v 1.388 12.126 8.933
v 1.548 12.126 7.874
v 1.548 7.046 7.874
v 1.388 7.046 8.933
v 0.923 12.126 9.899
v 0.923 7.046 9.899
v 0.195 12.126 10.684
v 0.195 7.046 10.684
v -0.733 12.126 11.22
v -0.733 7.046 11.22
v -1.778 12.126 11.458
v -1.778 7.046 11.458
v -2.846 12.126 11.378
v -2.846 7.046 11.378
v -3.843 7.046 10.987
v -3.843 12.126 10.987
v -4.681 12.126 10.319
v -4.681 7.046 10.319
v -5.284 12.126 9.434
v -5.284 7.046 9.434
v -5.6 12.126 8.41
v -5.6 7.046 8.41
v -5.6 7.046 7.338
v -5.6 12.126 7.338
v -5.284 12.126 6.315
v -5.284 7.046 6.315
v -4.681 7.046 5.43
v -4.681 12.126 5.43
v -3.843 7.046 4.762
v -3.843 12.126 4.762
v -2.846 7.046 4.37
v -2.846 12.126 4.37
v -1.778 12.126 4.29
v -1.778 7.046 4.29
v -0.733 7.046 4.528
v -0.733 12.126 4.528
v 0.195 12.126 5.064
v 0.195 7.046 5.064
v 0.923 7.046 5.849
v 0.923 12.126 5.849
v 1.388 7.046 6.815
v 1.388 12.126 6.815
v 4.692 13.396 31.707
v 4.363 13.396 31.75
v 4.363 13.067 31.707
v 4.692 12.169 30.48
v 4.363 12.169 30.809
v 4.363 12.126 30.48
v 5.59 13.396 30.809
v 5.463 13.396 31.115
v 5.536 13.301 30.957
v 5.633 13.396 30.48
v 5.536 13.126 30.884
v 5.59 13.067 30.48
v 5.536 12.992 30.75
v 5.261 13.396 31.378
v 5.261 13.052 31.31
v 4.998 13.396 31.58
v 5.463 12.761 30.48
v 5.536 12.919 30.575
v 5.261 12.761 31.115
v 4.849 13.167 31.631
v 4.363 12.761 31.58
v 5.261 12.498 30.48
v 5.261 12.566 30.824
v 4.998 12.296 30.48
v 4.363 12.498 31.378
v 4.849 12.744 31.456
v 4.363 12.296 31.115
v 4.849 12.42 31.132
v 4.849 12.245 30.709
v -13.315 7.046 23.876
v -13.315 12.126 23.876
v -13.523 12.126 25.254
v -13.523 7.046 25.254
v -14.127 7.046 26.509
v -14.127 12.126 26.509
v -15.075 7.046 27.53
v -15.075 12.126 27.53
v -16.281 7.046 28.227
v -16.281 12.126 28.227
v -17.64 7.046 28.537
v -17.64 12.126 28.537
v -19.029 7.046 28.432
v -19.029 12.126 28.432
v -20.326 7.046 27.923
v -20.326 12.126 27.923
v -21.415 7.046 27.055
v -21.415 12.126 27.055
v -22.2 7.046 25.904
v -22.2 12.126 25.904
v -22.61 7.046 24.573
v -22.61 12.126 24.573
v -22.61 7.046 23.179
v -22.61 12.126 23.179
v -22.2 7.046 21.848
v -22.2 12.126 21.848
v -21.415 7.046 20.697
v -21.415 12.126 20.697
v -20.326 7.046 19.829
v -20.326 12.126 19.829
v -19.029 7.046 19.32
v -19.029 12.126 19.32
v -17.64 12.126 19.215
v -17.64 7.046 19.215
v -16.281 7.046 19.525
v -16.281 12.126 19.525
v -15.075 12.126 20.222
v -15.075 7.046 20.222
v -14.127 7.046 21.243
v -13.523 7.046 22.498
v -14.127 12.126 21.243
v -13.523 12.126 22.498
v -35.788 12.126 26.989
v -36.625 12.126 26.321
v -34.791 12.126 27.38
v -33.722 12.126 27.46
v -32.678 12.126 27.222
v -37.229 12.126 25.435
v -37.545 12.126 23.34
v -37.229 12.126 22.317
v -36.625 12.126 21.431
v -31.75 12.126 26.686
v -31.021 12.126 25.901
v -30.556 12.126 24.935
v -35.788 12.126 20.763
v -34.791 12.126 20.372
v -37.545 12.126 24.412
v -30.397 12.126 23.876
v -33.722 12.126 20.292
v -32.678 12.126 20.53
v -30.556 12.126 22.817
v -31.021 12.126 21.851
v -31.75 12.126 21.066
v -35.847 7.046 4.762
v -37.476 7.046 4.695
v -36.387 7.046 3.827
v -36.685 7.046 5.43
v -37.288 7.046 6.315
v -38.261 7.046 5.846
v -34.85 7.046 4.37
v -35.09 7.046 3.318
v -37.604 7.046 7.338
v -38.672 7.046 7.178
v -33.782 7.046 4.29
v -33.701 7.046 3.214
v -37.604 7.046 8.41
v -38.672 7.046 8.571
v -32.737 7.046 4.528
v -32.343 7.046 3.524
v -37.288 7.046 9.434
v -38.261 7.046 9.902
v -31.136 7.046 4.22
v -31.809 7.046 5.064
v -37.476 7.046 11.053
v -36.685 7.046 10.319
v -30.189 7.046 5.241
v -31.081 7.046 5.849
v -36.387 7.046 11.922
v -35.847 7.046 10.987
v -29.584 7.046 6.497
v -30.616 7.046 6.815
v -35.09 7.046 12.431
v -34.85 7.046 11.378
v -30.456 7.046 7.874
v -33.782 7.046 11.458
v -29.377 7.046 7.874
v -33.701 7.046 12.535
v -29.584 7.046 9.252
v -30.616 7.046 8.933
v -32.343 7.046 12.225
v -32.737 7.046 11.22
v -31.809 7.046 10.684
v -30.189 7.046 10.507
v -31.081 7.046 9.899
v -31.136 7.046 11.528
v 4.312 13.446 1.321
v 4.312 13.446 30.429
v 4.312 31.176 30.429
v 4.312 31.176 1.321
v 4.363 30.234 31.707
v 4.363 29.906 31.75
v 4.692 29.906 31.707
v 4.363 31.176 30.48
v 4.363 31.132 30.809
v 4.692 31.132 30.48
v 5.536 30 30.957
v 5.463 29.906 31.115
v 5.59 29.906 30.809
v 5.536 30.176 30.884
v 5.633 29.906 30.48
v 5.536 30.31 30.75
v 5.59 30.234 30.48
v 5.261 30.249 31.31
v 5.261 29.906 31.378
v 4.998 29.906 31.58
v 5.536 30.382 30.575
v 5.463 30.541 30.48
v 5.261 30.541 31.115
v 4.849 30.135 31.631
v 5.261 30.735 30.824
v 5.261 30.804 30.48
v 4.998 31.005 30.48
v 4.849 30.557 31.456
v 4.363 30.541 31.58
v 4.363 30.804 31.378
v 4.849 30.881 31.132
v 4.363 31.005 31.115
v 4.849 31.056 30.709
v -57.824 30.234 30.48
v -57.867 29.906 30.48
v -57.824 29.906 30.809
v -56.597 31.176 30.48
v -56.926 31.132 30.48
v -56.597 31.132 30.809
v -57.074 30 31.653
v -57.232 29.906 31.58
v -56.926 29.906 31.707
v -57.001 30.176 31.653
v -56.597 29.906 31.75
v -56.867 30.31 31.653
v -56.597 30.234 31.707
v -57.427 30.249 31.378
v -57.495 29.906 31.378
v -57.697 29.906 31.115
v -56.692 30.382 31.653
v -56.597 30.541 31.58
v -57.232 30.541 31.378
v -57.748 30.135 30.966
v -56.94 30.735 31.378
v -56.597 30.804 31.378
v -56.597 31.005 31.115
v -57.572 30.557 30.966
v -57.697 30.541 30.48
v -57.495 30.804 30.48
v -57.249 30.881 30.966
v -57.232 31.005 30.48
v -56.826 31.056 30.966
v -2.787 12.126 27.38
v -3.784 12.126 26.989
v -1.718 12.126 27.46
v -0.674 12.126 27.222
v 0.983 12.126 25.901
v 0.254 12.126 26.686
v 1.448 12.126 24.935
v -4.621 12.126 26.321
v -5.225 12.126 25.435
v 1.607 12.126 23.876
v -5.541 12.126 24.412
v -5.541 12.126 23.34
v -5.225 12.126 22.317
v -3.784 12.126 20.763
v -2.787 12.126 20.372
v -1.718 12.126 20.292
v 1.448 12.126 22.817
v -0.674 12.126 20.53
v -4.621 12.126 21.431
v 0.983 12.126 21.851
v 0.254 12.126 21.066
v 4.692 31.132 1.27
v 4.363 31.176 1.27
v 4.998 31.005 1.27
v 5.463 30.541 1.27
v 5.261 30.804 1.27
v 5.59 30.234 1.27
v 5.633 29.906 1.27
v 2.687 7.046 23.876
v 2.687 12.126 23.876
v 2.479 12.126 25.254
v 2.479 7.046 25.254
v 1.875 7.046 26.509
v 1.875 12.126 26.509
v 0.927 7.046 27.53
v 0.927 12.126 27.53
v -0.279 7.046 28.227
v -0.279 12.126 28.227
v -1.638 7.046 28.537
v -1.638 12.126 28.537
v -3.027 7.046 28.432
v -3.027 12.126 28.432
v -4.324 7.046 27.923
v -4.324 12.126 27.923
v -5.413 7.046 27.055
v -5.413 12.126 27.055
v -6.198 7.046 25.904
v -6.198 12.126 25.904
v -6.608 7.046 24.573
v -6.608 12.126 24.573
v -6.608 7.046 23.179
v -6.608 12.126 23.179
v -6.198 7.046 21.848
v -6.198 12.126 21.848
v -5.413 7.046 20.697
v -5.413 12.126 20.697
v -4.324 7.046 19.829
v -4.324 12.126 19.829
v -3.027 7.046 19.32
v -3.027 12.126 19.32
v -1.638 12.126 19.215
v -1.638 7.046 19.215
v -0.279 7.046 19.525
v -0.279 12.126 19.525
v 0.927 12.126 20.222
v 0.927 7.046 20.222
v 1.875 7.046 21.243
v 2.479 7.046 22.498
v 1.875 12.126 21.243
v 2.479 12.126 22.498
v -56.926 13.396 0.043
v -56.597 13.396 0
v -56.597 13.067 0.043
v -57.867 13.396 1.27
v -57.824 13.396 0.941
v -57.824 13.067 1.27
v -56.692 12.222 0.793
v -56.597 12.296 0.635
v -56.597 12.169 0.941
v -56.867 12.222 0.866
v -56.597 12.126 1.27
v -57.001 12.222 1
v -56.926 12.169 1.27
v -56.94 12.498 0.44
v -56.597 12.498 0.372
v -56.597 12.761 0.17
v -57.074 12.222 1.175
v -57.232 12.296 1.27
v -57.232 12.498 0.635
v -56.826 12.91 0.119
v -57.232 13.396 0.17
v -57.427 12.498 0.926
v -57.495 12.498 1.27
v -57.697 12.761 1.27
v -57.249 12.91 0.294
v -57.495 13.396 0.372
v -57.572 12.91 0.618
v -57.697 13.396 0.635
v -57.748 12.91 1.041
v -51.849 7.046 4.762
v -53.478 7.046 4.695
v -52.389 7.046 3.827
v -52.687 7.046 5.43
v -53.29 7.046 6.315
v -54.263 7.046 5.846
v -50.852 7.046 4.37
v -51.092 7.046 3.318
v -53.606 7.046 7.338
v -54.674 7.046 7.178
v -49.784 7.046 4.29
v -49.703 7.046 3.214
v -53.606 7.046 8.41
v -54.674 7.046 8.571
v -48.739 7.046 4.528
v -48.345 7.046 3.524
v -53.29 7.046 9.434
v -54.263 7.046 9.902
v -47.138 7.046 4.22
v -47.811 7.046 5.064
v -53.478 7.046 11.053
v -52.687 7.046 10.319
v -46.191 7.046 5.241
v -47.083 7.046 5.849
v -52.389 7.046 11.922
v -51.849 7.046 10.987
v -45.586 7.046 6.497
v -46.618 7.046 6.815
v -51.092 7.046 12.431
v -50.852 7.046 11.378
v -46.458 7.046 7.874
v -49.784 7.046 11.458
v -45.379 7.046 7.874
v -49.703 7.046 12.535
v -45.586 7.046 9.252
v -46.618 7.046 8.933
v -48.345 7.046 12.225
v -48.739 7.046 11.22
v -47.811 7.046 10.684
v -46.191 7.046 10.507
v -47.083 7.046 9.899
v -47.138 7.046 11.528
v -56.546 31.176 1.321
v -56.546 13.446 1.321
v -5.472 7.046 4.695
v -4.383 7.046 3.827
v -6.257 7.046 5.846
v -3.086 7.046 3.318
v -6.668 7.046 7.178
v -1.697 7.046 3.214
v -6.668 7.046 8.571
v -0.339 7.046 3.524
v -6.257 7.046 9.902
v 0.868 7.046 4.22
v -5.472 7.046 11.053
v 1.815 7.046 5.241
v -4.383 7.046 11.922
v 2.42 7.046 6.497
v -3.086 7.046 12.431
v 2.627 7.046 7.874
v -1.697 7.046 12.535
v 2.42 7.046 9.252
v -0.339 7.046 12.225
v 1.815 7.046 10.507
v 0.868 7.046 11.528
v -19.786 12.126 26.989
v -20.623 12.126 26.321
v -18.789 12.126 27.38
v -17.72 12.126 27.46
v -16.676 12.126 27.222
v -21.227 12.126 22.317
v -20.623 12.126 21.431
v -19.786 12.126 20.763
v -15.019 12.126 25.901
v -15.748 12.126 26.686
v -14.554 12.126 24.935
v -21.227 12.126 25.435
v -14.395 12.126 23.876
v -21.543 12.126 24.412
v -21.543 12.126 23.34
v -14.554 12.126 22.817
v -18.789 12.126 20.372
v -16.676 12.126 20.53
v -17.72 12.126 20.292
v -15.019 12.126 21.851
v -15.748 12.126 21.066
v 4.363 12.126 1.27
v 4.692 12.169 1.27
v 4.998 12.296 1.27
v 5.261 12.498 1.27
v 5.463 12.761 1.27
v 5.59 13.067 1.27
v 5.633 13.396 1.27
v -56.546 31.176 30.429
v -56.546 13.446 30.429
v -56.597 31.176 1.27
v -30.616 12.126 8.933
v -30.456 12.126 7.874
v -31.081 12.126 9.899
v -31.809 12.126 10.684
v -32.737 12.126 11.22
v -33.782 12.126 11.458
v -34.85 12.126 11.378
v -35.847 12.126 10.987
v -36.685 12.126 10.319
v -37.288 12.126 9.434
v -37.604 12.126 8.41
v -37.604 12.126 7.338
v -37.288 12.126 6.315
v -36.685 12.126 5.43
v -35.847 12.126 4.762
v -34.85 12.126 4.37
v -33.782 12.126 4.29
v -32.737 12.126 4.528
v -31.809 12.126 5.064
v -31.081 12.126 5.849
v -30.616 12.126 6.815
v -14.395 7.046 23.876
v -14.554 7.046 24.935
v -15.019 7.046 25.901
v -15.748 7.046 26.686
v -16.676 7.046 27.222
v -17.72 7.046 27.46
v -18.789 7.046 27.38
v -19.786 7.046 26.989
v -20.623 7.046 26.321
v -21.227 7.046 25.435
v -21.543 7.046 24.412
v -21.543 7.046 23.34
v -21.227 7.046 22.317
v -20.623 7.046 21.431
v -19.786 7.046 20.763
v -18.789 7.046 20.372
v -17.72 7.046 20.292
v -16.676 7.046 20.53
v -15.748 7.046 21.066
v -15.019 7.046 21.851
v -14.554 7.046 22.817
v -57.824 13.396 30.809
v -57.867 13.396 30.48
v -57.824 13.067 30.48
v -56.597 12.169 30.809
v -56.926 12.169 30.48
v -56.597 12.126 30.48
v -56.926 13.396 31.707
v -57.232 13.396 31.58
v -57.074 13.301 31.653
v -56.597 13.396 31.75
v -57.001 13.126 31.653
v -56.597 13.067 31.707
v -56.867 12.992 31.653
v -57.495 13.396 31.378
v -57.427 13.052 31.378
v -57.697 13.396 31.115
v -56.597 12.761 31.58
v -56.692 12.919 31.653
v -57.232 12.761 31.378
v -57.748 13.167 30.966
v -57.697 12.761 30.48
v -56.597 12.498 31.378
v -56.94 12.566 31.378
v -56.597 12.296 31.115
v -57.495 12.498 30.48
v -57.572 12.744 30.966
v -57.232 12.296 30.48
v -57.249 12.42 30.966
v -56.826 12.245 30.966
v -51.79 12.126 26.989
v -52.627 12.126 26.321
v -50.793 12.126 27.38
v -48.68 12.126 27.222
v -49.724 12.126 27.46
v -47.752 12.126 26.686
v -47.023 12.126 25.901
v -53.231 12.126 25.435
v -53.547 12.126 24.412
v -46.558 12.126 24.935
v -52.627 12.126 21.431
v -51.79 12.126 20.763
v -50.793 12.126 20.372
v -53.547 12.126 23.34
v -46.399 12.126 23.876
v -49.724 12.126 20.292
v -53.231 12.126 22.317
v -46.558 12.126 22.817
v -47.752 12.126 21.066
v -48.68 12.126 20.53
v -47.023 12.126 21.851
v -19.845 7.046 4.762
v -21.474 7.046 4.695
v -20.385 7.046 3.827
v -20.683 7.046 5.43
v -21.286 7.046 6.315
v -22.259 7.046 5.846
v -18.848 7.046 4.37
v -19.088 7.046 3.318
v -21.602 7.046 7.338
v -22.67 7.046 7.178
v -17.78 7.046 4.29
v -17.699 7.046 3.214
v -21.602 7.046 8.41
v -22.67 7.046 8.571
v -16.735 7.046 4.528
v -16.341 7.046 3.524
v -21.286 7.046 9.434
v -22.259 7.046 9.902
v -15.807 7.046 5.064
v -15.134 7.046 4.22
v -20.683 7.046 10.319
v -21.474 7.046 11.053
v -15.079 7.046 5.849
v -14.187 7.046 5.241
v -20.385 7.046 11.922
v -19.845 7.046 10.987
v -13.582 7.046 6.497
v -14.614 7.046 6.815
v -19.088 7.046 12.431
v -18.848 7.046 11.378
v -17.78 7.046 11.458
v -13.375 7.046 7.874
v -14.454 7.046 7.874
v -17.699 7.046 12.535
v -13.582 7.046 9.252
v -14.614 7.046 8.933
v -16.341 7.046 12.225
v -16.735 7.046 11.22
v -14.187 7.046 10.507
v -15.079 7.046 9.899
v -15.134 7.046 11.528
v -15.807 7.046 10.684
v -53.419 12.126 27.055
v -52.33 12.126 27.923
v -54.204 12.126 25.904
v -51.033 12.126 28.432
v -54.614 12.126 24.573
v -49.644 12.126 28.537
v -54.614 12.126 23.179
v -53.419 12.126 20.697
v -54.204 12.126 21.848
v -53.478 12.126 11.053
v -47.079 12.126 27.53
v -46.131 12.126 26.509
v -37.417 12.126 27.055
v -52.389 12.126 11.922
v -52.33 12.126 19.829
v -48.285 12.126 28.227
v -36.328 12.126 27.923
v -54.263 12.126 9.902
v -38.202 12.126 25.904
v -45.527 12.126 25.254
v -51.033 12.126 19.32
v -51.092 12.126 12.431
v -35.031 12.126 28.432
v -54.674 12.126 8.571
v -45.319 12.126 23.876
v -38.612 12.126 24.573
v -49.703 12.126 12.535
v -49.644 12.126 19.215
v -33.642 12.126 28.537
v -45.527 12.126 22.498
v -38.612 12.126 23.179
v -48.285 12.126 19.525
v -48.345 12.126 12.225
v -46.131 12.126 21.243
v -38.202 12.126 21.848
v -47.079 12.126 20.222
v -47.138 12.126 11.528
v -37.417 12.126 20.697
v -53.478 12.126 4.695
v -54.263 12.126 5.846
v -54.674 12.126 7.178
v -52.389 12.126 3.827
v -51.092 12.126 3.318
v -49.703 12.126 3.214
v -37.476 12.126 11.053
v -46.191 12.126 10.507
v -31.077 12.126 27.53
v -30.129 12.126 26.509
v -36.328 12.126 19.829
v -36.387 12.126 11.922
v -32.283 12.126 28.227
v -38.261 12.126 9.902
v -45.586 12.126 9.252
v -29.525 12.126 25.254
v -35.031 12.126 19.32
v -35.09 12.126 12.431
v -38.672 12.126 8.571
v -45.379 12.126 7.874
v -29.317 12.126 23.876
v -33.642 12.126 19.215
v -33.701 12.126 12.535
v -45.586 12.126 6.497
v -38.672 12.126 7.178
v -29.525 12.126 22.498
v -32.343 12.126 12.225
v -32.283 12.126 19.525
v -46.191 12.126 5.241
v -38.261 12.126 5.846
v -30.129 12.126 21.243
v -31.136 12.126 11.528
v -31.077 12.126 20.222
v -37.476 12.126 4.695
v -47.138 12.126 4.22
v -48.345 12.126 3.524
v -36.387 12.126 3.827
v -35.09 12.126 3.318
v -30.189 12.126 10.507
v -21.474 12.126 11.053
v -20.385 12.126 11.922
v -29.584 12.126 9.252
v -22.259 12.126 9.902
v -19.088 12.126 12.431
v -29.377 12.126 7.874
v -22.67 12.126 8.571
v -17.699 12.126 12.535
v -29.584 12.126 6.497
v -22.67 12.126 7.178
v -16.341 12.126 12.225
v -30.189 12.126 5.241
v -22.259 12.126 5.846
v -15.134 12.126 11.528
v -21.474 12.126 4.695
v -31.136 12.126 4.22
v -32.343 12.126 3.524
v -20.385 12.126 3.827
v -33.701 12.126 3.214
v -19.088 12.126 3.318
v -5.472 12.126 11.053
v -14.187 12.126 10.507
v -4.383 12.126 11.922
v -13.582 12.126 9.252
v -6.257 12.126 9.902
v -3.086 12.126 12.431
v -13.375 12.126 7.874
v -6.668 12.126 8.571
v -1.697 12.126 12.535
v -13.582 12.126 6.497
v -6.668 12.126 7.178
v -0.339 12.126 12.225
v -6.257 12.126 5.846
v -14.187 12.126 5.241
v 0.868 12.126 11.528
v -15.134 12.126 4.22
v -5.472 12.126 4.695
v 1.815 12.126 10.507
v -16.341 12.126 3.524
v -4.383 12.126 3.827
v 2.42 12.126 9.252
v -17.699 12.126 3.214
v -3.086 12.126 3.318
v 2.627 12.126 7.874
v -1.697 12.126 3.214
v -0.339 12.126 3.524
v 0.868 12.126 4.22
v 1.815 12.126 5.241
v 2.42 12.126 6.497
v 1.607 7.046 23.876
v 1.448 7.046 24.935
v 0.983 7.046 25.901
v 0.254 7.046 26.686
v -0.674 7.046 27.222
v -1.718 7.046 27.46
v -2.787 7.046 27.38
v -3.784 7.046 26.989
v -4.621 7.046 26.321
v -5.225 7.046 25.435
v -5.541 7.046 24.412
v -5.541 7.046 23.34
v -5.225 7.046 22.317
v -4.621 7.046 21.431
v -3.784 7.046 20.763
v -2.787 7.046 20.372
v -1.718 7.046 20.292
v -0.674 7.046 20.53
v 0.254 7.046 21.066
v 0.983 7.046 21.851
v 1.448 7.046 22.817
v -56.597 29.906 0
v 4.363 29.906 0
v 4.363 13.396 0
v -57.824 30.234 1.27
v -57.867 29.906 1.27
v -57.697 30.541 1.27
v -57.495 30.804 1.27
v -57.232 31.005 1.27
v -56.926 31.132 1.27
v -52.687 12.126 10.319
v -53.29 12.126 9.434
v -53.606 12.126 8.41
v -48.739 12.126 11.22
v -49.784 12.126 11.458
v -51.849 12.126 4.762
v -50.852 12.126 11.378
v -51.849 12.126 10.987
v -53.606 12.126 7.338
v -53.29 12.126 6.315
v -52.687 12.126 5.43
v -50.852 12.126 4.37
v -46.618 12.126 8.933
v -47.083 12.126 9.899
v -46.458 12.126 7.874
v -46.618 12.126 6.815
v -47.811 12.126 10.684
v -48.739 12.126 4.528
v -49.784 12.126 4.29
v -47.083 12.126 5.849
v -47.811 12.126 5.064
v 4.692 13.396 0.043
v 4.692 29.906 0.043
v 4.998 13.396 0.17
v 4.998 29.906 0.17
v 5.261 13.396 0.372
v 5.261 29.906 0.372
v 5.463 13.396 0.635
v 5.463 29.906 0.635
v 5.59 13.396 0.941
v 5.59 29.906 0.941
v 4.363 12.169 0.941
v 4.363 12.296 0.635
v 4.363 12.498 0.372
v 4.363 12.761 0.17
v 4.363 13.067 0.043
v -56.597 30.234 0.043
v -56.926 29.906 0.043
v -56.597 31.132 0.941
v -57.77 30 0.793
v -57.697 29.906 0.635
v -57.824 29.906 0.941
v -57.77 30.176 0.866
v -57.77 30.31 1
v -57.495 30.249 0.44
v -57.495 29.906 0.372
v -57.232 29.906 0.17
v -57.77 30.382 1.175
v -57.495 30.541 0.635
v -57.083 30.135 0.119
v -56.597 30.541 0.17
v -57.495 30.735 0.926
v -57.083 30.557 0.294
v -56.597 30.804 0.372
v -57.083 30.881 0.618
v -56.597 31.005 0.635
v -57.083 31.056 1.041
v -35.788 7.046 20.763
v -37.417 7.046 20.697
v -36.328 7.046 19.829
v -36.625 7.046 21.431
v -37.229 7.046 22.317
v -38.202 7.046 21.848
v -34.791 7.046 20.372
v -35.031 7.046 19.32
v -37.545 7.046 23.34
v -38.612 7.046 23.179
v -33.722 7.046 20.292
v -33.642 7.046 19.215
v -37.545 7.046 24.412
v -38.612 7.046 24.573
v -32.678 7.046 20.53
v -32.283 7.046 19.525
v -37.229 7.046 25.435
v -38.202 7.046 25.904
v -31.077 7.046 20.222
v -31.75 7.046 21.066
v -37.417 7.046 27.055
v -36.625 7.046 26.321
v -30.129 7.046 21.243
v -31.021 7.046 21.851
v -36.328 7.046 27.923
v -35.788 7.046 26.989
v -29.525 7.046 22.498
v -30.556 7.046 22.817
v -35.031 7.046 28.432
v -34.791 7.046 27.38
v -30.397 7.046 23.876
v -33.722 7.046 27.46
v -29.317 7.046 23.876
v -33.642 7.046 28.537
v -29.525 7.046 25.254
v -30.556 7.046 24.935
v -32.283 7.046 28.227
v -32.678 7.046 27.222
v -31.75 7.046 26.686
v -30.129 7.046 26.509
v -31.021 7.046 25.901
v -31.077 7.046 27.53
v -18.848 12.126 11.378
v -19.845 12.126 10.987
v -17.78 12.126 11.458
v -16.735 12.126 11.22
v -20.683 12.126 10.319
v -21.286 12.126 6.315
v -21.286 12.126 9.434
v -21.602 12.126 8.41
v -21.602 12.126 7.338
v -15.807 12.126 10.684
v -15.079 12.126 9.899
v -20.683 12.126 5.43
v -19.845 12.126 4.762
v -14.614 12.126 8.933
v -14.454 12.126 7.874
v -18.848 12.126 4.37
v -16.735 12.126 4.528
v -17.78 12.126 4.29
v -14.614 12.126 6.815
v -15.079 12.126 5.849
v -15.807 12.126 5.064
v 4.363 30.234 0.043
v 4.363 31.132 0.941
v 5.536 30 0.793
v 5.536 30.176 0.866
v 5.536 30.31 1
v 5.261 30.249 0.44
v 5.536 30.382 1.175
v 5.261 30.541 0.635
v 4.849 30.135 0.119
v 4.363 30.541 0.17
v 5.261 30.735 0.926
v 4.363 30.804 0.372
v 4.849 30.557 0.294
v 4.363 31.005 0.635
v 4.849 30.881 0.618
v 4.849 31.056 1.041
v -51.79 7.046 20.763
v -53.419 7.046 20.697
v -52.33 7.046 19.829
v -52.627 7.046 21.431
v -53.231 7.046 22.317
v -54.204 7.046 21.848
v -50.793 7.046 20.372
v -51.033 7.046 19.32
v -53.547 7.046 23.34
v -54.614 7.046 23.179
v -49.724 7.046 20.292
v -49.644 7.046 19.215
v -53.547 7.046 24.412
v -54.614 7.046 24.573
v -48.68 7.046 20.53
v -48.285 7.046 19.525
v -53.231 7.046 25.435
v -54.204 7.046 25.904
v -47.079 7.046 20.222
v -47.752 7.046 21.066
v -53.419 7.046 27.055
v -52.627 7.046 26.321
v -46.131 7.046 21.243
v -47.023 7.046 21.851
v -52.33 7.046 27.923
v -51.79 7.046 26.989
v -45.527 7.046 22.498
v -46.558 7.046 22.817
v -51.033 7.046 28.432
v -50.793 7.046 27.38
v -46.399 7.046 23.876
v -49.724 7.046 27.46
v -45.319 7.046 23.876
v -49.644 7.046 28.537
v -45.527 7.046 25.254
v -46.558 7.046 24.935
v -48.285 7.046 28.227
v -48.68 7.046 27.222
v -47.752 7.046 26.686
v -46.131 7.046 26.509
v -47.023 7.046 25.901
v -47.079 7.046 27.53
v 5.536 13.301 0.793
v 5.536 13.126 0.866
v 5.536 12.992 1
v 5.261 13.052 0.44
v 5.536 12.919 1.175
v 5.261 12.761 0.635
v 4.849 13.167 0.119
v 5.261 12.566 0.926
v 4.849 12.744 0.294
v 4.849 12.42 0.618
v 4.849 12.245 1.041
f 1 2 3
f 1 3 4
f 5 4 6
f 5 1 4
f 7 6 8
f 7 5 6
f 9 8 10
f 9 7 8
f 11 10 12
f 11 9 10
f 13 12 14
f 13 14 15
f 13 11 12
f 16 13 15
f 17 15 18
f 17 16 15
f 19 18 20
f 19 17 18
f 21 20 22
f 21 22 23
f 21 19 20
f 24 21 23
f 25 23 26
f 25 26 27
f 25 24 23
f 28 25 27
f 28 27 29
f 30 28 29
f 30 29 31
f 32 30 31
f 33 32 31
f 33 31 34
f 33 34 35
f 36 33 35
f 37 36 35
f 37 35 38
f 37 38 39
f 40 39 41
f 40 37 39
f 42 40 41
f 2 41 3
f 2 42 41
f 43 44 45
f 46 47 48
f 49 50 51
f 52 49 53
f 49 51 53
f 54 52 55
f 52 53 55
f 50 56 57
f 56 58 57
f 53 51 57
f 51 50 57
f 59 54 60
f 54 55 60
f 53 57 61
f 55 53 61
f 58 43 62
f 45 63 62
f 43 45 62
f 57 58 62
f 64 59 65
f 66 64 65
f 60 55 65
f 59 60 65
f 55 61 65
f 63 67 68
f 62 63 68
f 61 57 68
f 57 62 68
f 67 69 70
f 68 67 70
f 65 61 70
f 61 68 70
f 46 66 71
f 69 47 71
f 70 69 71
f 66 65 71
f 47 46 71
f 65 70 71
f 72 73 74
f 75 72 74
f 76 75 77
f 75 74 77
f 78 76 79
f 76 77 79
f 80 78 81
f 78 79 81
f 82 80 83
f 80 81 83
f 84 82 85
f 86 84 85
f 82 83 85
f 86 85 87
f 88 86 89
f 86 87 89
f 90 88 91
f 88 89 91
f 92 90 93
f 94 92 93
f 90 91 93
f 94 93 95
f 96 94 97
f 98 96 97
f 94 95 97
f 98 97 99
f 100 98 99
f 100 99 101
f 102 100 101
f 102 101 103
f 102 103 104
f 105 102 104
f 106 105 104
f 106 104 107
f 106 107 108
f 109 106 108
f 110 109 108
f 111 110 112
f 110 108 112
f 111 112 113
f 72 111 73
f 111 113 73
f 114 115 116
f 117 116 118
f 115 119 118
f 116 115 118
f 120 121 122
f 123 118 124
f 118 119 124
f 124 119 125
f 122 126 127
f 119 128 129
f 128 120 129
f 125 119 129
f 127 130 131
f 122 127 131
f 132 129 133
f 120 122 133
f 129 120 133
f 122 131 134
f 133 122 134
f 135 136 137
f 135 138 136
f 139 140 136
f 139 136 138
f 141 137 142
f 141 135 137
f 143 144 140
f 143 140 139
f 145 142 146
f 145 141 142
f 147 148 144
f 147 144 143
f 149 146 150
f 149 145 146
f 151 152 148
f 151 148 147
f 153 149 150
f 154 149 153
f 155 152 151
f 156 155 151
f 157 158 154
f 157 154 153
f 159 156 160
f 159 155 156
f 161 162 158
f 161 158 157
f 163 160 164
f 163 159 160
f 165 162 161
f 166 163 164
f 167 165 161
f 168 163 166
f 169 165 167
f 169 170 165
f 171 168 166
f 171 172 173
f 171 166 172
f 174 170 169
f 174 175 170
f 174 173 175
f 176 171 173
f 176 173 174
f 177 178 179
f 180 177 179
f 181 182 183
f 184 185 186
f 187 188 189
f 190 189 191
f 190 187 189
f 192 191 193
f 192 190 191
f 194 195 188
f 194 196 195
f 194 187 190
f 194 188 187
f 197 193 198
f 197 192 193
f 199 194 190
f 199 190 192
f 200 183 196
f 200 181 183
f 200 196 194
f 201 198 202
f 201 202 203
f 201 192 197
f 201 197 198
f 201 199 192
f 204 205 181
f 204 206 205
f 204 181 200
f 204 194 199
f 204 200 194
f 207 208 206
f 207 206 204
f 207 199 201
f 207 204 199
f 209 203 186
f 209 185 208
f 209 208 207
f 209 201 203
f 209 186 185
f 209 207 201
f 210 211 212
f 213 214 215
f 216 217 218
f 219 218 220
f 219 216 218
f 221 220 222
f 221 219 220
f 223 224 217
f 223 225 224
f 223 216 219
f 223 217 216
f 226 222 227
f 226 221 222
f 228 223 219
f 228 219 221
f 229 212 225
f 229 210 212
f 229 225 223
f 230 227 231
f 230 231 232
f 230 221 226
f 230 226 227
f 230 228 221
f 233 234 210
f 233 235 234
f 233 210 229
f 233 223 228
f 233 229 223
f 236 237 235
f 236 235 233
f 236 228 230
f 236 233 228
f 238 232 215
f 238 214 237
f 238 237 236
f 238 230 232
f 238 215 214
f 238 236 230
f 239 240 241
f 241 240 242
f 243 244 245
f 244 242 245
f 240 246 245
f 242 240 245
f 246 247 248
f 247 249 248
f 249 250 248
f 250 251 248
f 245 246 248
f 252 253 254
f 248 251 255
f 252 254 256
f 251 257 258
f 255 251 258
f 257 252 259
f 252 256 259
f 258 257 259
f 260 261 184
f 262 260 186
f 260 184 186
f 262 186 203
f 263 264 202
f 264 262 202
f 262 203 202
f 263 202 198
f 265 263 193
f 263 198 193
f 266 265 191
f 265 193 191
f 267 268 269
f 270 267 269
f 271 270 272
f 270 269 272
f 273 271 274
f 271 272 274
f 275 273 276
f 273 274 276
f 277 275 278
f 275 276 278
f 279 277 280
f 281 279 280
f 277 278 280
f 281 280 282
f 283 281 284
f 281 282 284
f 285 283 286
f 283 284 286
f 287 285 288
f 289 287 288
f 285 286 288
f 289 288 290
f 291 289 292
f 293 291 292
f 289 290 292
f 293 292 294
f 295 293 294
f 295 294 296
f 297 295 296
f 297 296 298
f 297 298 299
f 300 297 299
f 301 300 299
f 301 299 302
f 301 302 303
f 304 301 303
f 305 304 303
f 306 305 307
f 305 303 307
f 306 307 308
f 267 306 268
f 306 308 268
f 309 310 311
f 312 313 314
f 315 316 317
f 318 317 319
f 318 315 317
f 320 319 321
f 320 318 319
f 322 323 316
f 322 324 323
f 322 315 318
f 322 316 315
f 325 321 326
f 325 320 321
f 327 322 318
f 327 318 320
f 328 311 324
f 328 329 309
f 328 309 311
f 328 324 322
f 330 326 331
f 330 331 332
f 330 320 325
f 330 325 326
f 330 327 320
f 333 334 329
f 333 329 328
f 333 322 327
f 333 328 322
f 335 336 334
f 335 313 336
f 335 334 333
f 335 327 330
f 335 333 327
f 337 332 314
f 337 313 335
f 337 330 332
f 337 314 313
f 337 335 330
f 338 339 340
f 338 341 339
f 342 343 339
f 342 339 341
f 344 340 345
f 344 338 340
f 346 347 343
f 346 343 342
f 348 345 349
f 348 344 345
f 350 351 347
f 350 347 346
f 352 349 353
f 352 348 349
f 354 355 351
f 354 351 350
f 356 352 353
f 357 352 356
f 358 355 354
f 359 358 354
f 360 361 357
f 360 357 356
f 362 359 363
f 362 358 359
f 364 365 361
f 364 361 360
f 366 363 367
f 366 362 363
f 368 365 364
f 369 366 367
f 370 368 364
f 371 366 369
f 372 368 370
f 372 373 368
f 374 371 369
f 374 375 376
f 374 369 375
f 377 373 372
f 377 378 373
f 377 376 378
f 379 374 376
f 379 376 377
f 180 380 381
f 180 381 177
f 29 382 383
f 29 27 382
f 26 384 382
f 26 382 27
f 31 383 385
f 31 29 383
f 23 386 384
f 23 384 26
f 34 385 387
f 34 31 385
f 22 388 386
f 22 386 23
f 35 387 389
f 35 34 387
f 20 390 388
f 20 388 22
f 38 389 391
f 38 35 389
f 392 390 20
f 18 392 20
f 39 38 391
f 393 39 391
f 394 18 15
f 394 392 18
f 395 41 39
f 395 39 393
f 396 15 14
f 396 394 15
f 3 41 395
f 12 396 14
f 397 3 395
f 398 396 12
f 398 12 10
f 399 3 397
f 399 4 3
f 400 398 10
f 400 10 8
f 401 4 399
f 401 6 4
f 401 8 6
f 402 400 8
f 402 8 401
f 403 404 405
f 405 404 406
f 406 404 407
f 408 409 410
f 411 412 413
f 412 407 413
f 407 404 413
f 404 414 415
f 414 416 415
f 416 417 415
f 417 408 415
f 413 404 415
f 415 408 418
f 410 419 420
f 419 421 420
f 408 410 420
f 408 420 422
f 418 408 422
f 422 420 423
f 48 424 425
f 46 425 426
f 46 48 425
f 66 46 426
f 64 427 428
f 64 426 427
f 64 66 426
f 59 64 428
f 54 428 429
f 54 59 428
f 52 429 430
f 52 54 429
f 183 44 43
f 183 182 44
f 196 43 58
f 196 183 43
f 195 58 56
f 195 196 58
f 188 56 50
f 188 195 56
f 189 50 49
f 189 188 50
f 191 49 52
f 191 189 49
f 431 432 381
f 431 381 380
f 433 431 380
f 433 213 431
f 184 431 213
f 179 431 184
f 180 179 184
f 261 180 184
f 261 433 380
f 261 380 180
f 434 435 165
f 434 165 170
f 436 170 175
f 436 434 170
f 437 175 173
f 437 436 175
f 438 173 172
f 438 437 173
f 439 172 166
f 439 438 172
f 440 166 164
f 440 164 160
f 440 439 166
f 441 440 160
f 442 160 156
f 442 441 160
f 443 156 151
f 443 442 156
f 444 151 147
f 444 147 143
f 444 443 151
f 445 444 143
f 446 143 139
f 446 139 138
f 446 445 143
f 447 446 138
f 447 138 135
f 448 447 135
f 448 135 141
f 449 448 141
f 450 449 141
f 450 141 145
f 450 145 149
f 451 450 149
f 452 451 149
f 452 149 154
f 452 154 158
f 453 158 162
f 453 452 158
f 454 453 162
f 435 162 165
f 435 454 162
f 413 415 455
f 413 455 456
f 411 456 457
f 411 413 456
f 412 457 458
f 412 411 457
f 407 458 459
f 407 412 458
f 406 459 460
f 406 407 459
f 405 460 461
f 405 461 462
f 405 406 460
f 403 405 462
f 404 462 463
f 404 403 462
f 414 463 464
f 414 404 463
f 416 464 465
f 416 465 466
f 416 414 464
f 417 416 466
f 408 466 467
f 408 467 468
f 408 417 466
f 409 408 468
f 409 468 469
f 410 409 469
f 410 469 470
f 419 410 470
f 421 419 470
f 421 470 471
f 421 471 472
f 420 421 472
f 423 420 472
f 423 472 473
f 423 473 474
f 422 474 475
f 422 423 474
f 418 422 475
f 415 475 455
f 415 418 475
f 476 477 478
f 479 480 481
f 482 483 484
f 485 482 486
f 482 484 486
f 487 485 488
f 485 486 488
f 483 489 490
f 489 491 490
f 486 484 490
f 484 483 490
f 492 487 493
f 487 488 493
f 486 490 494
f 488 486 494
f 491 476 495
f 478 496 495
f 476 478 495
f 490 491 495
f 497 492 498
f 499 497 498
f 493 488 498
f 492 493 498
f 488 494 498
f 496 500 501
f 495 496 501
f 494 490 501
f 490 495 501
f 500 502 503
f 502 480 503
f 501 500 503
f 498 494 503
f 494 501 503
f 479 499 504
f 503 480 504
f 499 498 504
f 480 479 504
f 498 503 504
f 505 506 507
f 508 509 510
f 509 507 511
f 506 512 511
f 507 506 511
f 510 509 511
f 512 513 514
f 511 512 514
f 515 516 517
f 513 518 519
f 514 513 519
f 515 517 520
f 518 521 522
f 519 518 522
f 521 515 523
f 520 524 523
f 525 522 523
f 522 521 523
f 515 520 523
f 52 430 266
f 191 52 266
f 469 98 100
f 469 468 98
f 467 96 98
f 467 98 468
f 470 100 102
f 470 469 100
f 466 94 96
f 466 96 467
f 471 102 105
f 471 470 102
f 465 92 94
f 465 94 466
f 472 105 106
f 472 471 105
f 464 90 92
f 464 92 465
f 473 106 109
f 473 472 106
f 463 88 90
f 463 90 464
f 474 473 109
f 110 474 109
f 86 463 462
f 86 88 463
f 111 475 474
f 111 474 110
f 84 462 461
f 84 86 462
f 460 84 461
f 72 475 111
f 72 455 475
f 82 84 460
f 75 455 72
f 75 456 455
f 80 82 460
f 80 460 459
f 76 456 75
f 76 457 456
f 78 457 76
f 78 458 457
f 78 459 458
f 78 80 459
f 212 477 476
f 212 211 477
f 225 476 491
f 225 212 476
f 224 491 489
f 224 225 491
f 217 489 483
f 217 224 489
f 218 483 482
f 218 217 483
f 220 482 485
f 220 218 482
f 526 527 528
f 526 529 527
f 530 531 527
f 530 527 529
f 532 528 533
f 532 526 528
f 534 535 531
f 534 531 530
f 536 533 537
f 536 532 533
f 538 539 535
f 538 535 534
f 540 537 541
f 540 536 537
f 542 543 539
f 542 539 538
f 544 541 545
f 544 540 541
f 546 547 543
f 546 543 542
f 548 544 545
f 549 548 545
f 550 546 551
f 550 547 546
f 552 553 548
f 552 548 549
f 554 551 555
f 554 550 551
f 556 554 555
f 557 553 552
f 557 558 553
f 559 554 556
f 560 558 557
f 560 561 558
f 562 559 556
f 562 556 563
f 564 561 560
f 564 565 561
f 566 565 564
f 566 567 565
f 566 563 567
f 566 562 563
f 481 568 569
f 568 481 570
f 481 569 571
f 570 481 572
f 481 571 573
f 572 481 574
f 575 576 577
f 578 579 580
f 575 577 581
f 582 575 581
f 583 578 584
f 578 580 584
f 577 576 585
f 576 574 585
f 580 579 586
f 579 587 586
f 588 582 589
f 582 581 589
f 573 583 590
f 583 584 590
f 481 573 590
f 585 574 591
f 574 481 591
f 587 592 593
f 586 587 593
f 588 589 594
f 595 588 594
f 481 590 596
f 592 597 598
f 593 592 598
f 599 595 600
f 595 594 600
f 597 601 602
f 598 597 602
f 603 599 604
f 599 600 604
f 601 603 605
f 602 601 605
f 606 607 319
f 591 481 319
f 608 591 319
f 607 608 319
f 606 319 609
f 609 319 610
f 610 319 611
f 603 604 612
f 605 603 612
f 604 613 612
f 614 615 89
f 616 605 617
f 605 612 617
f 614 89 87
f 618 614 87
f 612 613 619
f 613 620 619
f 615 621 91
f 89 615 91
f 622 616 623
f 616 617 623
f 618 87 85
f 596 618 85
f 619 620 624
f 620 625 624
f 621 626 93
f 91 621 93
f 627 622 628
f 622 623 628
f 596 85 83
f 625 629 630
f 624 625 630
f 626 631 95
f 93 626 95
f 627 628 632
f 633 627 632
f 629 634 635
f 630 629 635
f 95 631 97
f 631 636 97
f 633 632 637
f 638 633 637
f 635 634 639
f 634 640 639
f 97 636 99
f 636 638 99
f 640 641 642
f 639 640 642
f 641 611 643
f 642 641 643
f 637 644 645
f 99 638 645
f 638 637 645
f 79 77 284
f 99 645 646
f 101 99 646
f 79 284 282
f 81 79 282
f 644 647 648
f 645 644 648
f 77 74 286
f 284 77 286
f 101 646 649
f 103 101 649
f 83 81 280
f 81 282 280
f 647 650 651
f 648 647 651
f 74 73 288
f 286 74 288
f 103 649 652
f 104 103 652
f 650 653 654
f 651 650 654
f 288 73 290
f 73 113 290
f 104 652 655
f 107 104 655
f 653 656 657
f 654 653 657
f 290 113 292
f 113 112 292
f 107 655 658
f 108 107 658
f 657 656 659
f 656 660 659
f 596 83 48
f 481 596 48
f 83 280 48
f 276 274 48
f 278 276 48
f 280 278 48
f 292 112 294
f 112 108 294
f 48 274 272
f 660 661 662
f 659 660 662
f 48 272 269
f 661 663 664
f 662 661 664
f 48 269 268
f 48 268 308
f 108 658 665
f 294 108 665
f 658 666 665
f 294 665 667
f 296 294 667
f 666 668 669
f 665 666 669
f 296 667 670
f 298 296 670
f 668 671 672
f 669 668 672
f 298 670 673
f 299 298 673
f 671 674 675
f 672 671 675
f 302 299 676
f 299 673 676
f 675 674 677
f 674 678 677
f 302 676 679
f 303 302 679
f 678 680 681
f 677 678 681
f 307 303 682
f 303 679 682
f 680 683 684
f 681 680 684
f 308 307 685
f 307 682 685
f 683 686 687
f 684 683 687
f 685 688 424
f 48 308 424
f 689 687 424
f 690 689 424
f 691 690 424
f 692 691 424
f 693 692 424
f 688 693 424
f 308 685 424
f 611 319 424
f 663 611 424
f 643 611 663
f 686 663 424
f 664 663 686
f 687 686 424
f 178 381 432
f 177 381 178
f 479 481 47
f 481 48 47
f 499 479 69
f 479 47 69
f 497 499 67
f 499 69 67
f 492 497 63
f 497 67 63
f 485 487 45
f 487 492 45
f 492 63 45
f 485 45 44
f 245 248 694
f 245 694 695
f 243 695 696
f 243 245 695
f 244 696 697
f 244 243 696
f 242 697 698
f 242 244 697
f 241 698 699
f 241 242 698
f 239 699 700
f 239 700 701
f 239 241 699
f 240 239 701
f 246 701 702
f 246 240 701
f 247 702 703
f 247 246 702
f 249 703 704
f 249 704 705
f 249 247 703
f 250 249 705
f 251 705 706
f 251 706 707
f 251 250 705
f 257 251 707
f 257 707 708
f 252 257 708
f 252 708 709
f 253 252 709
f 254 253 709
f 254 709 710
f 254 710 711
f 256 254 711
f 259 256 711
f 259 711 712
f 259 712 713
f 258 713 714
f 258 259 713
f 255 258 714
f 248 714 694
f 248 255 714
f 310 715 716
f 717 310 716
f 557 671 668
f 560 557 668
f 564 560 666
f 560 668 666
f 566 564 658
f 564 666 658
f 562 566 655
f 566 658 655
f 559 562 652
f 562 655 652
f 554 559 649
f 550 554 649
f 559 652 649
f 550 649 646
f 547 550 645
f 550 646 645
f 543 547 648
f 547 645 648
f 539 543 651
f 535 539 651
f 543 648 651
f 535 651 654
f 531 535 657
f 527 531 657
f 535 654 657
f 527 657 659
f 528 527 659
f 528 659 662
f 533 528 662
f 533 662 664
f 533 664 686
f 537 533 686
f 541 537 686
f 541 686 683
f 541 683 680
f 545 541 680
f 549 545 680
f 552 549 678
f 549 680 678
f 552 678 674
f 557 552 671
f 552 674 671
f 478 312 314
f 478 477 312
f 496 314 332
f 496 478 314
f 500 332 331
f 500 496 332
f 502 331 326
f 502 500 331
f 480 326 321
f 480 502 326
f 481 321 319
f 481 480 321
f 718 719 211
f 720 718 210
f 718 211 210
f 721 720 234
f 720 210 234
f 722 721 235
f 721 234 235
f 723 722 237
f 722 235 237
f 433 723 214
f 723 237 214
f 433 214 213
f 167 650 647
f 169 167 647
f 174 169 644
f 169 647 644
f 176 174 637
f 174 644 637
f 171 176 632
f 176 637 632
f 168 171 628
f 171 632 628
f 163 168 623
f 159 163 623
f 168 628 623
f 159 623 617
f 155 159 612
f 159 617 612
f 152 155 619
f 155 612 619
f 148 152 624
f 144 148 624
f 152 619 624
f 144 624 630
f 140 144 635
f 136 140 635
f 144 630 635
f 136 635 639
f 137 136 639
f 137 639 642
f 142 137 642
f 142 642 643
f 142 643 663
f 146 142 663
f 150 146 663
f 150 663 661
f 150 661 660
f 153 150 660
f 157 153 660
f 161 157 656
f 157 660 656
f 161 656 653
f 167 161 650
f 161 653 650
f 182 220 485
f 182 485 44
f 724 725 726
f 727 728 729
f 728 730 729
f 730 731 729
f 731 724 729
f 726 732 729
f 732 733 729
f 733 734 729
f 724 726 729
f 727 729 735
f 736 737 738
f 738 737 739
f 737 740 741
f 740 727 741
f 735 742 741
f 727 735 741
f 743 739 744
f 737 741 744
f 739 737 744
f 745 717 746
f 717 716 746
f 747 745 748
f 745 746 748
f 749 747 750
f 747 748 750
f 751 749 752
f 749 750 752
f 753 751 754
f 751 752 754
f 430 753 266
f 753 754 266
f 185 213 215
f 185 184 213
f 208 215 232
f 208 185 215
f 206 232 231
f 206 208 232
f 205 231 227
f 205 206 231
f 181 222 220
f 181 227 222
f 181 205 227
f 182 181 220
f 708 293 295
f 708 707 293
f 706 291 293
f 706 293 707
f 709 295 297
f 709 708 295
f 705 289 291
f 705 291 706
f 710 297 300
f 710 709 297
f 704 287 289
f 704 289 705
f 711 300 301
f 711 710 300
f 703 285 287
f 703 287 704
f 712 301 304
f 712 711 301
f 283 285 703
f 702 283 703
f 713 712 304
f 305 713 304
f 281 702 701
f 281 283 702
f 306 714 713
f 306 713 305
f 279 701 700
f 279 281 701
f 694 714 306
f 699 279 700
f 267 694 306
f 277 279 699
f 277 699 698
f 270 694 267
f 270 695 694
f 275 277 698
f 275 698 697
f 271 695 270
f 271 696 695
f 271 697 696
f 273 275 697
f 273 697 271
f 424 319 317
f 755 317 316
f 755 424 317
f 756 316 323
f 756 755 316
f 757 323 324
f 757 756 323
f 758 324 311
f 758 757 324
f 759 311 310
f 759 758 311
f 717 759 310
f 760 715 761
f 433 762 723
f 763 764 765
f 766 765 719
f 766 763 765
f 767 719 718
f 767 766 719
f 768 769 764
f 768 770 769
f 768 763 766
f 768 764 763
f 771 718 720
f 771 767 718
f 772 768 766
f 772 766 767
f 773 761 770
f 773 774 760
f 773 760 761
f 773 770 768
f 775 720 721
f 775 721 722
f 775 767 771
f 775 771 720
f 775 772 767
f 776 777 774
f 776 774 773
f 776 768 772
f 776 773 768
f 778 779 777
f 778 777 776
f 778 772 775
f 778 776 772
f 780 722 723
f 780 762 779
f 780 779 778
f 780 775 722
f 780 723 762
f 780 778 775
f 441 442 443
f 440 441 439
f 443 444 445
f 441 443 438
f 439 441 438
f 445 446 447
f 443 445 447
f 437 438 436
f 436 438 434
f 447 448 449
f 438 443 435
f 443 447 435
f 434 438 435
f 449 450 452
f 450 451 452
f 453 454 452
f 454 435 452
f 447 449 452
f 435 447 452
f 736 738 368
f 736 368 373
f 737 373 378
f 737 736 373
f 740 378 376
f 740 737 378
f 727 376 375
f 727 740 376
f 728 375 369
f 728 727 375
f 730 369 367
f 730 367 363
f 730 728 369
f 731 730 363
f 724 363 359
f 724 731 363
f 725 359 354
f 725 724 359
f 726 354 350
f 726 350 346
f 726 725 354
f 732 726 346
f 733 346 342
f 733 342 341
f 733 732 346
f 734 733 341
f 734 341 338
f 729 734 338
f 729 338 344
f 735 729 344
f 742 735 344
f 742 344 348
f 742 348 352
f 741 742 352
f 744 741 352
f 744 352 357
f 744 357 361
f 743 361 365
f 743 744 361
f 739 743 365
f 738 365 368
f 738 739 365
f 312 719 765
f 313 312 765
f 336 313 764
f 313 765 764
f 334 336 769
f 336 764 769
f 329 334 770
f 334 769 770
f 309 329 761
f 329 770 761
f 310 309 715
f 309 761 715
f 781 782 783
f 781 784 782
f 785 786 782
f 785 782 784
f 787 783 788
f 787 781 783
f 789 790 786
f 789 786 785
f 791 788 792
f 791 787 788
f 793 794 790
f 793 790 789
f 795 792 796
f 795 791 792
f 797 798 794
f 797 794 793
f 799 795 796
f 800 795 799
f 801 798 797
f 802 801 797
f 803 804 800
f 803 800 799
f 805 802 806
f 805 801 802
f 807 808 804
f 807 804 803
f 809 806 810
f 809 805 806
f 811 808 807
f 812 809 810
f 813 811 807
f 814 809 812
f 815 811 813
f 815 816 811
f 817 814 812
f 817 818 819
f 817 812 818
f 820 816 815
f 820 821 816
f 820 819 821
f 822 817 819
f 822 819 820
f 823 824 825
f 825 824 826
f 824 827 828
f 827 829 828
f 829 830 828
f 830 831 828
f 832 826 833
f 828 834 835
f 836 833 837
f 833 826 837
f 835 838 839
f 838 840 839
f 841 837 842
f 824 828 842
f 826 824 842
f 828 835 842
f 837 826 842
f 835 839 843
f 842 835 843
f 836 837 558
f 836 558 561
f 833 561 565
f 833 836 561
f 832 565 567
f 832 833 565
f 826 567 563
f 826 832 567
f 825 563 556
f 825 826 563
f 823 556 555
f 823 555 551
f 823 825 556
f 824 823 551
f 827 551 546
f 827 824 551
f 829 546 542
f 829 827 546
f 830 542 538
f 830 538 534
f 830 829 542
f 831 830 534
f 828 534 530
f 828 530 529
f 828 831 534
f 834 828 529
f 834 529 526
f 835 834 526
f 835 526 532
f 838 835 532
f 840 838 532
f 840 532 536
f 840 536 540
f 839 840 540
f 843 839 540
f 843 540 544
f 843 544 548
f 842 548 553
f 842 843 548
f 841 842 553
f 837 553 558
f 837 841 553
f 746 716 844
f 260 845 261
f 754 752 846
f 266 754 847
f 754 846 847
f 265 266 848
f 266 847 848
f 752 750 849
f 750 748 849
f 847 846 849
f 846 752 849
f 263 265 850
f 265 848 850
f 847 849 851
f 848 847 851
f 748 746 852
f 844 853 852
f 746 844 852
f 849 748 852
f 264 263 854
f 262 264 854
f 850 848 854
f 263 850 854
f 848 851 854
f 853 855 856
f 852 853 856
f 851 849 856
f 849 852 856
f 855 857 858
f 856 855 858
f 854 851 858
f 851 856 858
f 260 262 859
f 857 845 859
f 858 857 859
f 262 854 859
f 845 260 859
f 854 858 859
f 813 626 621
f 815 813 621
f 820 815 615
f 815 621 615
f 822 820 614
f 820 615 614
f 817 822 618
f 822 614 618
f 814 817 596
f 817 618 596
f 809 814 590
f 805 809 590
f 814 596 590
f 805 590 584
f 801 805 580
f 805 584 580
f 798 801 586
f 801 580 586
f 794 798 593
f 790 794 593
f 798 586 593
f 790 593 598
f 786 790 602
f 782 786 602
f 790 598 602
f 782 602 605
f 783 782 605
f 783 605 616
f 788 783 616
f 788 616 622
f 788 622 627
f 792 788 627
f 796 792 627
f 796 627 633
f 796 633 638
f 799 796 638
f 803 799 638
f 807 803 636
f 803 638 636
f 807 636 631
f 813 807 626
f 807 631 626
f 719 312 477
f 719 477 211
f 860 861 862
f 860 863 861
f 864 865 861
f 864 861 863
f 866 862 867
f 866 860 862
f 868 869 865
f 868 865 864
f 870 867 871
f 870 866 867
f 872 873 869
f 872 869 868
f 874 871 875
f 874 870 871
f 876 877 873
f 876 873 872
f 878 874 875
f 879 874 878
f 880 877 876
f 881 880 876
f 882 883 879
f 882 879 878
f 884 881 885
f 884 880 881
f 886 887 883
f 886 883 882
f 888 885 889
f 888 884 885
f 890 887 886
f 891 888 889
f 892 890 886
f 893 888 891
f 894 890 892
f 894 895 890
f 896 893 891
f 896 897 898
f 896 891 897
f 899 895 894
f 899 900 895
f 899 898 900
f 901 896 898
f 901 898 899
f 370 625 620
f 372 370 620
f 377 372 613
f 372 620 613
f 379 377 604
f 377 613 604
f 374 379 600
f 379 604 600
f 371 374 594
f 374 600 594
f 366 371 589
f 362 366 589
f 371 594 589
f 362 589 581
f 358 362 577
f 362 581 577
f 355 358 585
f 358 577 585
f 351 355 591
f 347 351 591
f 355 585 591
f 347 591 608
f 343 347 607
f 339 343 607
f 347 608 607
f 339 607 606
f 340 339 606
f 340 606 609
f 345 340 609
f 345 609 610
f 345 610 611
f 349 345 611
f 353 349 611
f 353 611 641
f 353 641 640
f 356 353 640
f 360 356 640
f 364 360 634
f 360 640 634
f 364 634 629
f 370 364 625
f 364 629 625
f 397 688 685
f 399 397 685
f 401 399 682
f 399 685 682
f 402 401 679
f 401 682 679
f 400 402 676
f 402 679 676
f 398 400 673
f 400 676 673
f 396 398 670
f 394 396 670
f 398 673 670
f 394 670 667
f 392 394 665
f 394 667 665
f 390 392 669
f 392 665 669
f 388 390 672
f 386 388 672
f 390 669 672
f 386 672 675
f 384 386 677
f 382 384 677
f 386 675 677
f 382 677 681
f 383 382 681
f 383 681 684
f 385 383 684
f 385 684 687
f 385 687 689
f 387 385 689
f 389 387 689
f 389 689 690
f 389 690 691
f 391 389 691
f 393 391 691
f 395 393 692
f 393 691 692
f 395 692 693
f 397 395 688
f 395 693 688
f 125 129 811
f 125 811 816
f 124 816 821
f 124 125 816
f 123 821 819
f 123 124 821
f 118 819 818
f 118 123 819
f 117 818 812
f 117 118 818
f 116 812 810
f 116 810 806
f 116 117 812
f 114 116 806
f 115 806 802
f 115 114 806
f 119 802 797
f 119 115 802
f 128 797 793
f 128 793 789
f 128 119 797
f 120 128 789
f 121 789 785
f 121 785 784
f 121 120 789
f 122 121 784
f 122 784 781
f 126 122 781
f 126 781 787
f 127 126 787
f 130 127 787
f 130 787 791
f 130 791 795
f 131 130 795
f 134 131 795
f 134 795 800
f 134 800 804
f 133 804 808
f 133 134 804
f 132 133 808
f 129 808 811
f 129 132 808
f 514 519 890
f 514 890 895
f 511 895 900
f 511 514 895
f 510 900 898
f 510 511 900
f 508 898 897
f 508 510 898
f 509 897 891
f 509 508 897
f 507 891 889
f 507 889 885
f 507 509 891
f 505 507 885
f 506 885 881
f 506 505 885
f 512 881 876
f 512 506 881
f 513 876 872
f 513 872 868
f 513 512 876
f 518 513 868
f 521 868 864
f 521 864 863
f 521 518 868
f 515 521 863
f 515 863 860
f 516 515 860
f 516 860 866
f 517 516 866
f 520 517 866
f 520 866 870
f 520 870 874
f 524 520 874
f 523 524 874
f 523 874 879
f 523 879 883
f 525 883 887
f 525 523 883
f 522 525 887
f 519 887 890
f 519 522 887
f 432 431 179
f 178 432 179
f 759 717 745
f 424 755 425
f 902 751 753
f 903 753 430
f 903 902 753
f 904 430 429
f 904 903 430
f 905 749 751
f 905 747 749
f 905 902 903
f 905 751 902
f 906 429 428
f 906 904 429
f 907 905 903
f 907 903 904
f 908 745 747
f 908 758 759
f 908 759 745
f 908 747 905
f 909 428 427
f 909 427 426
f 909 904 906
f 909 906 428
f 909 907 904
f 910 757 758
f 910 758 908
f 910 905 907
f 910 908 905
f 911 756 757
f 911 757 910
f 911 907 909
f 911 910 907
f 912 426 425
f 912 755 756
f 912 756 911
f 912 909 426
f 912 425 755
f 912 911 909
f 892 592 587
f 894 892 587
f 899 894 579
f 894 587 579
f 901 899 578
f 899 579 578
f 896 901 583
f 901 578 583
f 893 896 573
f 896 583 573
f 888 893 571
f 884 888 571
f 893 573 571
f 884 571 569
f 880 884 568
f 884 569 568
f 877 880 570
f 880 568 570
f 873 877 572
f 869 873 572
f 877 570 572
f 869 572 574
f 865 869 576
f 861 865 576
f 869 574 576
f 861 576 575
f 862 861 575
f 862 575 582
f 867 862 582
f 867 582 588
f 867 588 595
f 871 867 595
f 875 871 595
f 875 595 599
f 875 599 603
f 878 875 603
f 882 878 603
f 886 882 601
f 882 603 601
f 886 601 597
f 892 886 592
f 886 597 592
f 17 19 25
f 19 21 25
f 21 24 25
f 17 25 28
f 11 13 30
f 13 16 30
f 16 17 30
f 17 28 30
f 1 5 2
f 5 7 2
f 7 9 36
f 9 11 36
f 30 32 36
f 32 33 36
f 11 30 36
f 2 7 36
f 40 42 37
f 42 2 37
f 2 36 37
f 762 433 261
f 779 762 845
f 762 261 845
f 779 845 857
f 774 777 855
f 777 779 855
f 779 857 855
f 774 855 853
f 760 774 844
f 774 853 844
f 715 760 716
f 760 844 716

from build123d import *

# Parameters (mm, degrees)
F0_W     = 63.5
F0_H     = 19.05
F1_DEPTH = 31.75
F2_T     = -1.3208
F3_R     = 4.6736
F3_R_2   = 3.5941
F4_DEPTH = 5.08
F5_R     = 1.27


with BuildPart() as f1:
    # F0 (on Top) → F1 (new body)
    with BuildSketch(Plane.XY):
        with Locations((-26.116837, 21.650621)):
            Rectangle(F0_W, F0_H)
    extrude(amount=F1_DEPTH)

    # F2
    f2_openings = [f1.faces().sort_by_distance(p)[0] for p in [
        (-26.116837, 31.175621, 15.875),
    ]]
    offset(amount=F2_T, openings=f2_openings)

    # F3 (on face) → F4 (join)
    with BuildSketch(Plane.XZ.offset(-12.125621)):
        with Locations((-49.992837, 23.876)):
            Circle(F3_R)
        with Locations((-49.992837, 23.876)):
            Circle(F3_R_2, mode=Mode.SUBTRACT)
        with Locations((-33.990837, 23.876)):
            Circle(F3_R)
        with Locations((-33.990837, 23.876)):
            Circle(F3_R_2, mode=Mode.SUBTRACT)
        with Locations((-17.988837, 23.876)):
            Circle(F3_R)
        with Locations((-17.988837, 23.876)):
            Circle(F3_R_2, mode=Mode.SUBTRACT)
        with Locations((-1.986837, 23.876)):
            Circle(F3_R)
        with Locations((-1.986837, 23.876)):
            Circle(F3_R_2, mode=Mode.SUBTRACT)
        with Locations((-50.052113, 7.87411)):
            Circle(F3_R)
        with Locations((-50.052113, 7.87411)):
            Circle(F3_R_2, mode=Mode.SUBTRACT)
        with Locations((-34.050113, 7.87411)):
            Circle(F3_R)
        with Locations((-34.050113, 7.87411)):
            Circle(F3_R_2, mode=Mode.SUBTRACT)
        with Locations((-18.048113, 7.87411)):
            Circle(F3_R)
        with Locations((-18.048113, 7.87411)):
            Circle(F3_R_2, mode=Mode.SUBTRACT)
        with Locations((-2.046113, 7.87411)):
            Circle(F3_R)
        with Locations((-2.046113, 7.87411)):
            Circle(F3_R_2, mode=Mode.SUBTRACT)
    extrude(amount=F4_DEPTH)

    # F5
    f5_edges = [f1.edges().sort_by_distance(p)[0] for p in [
        (-26.116837, 31.175621, 0),
        (-57.866837, 21.650621, 0),
        (-26.116837, 12.125621, 0),
        (5.633163, 21.650621, 0),
        (-57.866837, 31.175621, 15.875),
        (-57.866837, 12.125621, 15.875),
        (-57.866837, 21.650621, 31.75),
        (-26.116837, 31.175621, 31.75),
        (-26.116837, 12.125621, 31.75),
        (5.633163, 21.650621, 31.75),
        (5.633163, 12.125621, 15.875),
        (5.633163, 31.175621, 15.875),
    ]]
    fillet(f5_edges, radius=F5_R)


solid = f1.part
